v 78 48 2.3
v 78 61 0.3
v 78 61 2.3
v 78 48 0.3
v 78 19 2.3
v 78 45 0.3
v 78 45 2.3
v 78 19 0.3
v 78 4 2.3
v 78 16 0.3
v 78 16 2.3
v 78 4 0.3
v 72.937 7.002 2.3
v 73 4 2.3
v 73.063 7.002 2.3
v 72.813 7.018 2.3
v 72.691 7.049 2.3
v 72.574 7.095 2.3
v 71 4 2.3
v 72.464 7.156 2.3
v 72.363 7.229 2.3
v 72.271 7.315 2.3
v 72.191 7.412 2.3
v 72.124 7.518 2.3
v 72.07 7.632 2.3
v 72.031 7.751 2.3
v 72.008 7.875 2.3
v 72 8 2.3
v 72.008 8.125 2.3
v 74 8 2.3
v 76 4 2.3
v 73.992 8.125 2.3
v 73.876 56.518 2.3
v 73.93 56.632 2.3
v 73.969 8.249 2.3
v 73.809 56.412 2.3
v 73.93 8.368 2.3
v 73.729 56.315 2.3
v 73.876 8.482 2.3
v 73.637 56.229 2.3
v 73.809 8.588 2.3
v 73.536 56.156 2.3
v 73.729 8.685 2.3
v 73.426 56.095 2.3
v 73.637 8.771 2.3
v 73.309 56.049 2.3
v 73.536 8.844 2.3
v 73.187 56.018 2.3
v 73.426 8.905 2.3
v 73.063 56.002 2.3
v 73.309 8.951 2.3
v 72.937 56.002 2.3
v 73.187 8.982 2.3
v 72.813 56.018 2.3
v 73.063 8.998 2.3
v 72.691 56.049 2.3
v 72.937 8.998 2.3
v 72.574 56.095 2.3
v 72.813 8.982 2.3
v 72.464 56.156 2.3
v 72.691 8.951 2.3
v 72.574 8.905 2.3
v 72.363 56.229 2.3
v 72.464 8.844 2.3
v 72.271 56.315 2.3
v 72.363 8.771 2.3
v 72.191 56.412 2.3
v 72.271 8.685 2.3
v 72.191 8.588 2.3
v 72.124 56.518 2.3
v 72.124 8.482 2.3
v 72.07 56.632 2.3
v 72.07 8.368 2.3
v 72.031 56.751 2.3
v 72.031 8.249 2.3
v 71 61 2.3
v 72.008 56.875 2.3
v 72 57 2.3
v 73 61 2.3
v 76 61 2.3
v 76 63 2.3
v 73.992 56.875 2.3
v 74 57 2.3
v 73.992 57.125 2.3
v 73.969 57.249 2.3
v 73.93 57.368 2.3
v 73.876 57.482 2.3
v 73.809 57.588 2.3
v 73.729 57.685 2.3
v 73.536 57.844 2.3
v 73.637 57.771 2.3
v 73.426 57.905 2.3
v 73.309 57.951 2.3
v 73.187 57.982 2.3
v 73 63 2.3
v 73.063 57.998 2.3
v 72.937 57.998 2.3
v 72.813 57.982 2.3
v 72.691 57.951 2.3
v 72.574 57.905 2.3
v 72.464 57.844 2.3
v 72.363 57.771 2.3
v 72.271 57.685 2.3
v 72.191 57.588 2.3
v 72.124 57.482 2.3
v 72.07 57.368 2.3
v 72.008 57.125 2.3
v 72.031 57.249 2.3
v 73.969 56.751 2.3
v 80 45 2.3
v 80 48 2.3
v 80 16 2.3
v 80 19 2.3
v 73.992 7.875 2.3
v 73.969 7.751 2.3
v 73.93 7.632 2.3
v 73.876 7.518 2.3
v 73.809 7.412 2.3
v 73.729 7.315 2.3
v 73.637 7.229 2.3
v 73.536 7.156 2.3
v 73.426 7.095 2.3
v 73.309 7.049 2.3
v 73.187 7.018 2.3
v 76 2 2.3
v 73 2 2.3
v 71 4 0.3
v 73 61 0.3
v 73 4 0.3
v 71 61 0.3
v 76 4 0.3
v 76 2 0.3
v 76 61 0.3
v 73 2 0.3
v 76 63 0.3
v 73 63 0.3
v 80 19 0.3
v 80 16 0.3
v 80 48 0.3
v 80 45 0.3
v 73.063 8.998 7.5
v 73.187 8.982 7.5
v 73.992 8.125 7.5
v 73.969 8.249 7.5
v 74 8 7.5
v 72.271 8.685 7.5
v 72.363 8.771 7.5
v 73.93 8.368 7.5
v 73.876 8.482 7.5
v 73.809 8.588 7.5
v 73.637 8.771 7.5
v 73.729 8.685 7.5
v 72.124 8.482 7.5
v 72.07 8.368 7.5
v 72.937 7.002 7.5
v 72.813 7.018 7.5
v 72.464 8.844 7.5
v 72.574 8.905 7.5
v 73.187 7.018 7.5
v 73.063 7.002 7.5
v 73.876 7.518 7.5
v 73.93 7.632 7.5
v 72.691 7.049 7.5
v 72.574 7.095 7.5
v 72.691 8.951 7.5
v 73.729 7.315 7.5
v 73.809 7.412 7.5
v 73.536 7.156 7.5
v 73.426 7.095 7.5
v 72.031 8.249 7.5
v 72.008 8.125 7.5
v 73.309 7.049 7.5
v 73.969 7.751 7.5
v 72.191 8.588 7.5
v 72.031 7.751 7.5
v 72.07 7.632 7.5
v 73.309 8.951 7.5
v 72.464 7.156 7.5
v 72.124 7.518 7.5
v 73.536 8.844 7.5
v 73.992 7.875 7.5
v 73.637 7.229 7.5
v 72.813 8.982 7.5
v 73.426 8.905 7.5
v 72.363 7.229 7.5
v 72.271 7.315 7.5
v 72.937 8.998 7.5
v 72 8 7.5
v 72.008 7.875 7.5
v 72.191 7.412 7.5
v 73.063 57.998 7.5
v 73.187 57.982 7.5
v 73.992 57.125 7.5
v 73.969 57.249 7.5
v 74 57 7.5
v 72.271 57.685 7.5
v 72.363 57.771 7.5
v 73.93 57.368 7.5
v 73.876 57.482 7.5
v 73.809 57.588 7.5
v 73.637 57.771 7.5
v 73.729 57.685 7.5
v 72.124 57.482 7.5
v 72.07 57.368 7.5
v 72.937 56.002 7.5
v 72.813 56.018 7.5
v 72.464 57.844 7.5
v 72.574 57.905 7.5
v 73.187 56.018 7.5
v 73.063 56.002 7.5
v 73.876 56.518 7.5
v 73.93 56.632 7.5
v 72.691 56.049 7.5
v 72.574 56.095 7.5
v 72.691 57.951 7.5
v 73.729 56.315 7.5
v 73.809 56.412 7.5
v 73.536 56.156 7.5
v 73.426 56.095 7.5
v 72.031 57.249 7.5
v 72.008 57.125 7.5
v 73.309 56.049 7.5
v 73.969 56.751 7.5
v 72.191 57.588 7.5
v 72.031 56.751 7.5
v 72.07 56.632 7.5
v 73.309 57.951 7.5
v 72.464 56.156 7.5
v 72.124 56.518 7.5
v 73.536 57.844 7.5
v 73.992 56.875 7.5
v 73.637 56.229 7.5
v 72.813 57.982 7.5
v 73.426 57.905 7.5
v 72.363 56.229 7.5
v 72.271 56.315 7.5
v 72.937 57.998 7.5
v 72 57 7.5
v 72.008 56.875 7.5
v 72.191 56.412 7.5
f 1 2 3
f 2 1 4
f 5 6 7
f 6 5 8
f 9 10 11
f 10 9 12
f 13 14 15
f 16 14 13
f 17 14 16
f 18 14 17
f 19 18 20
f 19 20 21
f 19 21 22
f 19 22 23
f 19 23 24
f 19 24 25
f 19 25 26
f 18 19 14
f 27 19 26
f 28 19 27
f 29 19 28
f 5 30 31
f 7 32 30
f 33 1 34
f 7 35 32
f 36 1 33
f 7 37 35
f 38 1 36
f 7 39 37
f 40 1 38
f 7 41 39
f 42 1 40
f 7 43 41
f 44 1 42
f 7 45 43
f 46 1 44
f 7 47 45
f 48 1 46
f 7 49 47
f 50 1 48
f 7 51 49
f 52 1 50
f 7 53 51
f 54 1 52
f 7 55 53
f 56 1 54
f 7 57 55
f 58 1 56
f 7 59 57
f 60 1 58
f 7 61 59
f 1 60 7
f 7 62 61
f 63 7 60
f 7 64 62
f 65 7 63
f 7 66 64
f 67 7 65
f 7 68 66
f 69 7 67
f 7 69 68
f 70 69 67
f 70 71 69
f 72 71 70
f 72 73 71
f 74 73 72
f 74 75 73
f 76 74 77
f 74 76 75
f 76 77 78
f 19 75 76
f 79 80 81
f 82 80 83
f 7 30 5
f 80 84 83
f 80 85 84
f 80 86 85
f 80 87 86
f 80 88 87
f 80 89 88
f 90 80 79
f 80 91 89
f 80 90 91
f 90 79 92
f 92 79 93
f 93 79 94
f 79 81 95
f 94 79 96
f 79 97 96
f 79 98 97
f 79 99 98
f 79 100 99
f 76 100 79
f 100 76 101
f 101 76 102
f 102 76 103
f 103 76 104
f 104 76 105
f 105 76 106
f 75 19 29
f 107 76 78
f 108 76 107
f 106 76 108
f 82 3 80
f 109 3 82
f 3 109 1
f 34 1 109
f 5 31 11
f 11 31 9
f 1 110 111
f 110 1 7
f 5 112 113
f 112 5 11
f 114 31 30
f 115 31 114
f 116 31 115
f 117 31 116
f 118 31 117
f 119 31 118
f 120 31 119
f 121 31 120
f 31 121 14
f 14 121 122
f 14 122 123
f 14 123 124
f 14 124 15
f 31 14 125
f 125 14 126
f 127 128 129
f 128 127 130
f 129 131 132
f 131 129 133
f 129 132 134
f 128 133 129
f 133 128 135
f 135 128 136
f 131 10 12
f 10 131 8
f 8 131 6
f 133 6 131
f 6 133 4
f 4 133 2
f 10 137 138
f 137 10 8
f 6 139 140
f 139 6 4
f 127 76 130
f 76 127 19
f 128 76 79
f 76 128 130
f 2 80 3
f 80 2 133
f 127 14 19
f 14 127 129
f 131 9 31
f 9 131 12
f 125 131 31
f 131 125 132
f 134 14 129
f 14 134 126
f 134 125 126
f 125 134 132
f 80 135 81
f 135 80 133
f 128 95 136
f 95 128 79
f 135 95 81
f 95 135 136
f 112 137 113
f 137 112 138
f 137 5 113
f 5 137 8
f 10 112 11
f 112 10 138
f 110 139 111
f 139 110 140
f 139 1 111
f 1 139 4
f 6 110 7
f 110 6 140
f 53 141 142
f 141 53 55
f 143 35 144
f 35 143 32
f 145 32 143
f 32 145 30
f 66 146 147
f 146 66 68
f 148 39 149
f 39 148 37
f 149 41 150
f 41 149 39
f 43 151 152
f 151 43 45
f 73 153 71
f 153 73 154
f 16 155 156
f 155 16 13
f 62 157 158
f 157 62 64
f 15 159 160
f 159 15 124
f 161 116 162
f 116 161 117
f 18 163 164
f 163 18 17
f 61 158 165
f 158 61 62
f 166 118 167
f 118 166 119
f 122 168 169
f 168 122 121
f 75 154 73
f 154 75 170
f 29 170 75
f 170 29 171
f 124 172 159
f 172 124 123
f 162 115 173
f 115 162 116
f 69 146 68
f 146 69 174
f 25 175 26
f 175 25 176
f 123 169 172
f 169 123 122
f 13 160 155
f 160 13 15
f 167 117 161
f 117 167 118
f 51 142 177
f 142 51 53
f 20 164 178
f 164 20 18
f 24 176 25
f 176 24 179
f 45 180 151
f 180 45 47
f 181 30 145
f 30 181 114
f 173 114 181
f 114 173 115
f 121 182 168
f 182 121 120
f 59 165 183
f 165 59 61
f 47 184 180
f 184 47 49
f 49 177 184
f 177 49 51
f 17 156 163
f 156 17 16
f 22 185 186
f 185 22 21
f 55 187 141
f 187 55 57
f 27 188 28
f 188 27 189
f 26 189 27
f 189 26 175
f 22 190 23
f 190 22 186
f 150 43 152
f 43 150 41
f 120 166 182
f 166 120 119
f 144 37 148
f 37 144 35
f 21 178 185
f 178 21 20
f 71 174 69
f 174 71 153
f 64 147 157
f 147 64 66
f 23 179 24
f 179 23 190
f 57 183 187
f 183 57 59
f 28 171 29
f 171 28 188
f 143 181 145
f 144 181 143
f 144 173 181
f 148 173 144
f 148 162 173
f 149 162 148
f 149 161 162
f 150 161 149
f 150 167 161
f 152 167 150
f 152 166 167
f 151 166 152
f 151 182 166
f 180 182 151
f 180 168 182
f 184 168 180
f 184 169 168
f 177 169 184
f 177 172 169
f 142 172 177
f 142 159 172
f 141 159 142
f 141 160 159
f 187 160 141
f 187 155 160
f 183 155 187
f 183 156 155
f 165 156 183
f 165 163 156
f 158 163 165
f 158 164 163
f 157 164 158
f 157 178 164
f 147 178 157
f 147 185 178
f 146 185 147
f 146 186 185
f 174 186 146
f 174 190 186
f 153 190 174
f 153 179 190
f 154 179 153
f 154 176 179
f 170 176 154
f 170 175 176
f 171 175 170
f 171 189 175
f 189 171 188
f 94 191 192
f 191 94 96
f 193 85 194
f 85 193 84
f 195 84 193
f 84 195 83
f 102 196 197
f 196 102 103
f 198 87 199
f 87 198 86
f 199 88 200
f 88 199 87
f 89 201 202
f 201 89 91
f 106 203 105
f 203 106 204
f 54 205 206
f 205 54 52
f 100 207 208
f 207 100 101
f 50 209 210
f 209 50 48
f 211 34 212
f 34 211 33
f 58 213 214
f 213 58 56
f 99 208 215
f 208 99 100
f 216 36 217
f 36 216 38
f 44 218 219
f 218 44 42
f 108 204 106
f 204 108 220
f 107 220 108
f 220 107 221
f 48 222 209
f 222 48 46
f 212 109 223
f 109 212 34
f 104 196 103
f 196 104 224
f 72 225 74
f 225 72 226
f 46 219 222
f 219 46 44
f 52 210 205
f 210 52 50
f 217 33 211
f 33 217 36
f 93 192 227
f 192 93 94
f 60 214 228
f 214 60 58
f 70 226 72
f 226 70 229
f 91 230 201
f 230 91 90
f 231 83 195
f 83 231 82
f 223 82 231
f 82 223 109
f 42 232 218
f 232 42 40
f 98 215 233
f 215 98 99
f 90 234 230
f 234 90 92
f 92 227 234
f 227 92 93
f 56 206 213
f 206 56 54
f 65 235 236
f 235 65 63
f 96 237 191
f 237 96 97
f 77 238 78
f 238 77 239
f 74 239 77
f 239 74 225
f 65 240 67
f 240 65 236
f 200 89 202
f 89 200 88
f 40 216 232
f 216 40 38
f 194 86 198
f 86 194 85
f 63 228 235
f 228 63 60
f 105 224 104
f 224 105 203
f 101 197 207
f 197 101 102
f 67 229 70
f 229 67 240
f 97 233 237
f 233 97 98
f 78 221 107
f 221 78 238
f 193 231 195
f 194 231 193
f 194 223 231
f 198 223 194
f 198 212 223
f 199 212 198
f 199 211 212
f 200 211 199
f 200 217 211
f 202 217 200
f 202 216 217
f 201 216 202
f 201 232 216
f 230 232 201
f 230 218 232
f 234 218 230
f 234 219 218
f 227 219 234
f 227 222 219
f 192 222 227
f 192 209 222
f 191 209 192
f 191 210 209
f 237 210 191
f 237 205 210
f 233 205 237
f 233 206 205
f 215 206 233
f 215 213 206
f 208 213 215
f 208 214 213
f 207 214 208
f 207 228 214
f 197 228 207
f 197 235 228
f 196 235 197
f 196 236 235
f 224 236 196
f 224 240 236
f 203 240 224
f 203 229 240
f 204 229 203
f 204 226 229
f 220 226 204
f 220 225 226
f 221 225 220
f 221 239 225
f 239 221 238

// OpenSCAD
$fn=50;

translate([71,4,0.3]){
    cube([7,57,2]);
}
translate([73,2,0.3]){
    cube([3,2,2]);
}
translate([73,61,0.3]){
    cube([3,2,2]);
}
translate([78,16,0.3]){
    cube([2,3,2]);
}
translate([78,45,0.3]){
    cube([2,3,2]);
}
translate([73,8,0.3]){
    cylinder(7.2,1,1);
}
translate([73,57,0.3]){
    cylinder(7.2,1,1);
}
